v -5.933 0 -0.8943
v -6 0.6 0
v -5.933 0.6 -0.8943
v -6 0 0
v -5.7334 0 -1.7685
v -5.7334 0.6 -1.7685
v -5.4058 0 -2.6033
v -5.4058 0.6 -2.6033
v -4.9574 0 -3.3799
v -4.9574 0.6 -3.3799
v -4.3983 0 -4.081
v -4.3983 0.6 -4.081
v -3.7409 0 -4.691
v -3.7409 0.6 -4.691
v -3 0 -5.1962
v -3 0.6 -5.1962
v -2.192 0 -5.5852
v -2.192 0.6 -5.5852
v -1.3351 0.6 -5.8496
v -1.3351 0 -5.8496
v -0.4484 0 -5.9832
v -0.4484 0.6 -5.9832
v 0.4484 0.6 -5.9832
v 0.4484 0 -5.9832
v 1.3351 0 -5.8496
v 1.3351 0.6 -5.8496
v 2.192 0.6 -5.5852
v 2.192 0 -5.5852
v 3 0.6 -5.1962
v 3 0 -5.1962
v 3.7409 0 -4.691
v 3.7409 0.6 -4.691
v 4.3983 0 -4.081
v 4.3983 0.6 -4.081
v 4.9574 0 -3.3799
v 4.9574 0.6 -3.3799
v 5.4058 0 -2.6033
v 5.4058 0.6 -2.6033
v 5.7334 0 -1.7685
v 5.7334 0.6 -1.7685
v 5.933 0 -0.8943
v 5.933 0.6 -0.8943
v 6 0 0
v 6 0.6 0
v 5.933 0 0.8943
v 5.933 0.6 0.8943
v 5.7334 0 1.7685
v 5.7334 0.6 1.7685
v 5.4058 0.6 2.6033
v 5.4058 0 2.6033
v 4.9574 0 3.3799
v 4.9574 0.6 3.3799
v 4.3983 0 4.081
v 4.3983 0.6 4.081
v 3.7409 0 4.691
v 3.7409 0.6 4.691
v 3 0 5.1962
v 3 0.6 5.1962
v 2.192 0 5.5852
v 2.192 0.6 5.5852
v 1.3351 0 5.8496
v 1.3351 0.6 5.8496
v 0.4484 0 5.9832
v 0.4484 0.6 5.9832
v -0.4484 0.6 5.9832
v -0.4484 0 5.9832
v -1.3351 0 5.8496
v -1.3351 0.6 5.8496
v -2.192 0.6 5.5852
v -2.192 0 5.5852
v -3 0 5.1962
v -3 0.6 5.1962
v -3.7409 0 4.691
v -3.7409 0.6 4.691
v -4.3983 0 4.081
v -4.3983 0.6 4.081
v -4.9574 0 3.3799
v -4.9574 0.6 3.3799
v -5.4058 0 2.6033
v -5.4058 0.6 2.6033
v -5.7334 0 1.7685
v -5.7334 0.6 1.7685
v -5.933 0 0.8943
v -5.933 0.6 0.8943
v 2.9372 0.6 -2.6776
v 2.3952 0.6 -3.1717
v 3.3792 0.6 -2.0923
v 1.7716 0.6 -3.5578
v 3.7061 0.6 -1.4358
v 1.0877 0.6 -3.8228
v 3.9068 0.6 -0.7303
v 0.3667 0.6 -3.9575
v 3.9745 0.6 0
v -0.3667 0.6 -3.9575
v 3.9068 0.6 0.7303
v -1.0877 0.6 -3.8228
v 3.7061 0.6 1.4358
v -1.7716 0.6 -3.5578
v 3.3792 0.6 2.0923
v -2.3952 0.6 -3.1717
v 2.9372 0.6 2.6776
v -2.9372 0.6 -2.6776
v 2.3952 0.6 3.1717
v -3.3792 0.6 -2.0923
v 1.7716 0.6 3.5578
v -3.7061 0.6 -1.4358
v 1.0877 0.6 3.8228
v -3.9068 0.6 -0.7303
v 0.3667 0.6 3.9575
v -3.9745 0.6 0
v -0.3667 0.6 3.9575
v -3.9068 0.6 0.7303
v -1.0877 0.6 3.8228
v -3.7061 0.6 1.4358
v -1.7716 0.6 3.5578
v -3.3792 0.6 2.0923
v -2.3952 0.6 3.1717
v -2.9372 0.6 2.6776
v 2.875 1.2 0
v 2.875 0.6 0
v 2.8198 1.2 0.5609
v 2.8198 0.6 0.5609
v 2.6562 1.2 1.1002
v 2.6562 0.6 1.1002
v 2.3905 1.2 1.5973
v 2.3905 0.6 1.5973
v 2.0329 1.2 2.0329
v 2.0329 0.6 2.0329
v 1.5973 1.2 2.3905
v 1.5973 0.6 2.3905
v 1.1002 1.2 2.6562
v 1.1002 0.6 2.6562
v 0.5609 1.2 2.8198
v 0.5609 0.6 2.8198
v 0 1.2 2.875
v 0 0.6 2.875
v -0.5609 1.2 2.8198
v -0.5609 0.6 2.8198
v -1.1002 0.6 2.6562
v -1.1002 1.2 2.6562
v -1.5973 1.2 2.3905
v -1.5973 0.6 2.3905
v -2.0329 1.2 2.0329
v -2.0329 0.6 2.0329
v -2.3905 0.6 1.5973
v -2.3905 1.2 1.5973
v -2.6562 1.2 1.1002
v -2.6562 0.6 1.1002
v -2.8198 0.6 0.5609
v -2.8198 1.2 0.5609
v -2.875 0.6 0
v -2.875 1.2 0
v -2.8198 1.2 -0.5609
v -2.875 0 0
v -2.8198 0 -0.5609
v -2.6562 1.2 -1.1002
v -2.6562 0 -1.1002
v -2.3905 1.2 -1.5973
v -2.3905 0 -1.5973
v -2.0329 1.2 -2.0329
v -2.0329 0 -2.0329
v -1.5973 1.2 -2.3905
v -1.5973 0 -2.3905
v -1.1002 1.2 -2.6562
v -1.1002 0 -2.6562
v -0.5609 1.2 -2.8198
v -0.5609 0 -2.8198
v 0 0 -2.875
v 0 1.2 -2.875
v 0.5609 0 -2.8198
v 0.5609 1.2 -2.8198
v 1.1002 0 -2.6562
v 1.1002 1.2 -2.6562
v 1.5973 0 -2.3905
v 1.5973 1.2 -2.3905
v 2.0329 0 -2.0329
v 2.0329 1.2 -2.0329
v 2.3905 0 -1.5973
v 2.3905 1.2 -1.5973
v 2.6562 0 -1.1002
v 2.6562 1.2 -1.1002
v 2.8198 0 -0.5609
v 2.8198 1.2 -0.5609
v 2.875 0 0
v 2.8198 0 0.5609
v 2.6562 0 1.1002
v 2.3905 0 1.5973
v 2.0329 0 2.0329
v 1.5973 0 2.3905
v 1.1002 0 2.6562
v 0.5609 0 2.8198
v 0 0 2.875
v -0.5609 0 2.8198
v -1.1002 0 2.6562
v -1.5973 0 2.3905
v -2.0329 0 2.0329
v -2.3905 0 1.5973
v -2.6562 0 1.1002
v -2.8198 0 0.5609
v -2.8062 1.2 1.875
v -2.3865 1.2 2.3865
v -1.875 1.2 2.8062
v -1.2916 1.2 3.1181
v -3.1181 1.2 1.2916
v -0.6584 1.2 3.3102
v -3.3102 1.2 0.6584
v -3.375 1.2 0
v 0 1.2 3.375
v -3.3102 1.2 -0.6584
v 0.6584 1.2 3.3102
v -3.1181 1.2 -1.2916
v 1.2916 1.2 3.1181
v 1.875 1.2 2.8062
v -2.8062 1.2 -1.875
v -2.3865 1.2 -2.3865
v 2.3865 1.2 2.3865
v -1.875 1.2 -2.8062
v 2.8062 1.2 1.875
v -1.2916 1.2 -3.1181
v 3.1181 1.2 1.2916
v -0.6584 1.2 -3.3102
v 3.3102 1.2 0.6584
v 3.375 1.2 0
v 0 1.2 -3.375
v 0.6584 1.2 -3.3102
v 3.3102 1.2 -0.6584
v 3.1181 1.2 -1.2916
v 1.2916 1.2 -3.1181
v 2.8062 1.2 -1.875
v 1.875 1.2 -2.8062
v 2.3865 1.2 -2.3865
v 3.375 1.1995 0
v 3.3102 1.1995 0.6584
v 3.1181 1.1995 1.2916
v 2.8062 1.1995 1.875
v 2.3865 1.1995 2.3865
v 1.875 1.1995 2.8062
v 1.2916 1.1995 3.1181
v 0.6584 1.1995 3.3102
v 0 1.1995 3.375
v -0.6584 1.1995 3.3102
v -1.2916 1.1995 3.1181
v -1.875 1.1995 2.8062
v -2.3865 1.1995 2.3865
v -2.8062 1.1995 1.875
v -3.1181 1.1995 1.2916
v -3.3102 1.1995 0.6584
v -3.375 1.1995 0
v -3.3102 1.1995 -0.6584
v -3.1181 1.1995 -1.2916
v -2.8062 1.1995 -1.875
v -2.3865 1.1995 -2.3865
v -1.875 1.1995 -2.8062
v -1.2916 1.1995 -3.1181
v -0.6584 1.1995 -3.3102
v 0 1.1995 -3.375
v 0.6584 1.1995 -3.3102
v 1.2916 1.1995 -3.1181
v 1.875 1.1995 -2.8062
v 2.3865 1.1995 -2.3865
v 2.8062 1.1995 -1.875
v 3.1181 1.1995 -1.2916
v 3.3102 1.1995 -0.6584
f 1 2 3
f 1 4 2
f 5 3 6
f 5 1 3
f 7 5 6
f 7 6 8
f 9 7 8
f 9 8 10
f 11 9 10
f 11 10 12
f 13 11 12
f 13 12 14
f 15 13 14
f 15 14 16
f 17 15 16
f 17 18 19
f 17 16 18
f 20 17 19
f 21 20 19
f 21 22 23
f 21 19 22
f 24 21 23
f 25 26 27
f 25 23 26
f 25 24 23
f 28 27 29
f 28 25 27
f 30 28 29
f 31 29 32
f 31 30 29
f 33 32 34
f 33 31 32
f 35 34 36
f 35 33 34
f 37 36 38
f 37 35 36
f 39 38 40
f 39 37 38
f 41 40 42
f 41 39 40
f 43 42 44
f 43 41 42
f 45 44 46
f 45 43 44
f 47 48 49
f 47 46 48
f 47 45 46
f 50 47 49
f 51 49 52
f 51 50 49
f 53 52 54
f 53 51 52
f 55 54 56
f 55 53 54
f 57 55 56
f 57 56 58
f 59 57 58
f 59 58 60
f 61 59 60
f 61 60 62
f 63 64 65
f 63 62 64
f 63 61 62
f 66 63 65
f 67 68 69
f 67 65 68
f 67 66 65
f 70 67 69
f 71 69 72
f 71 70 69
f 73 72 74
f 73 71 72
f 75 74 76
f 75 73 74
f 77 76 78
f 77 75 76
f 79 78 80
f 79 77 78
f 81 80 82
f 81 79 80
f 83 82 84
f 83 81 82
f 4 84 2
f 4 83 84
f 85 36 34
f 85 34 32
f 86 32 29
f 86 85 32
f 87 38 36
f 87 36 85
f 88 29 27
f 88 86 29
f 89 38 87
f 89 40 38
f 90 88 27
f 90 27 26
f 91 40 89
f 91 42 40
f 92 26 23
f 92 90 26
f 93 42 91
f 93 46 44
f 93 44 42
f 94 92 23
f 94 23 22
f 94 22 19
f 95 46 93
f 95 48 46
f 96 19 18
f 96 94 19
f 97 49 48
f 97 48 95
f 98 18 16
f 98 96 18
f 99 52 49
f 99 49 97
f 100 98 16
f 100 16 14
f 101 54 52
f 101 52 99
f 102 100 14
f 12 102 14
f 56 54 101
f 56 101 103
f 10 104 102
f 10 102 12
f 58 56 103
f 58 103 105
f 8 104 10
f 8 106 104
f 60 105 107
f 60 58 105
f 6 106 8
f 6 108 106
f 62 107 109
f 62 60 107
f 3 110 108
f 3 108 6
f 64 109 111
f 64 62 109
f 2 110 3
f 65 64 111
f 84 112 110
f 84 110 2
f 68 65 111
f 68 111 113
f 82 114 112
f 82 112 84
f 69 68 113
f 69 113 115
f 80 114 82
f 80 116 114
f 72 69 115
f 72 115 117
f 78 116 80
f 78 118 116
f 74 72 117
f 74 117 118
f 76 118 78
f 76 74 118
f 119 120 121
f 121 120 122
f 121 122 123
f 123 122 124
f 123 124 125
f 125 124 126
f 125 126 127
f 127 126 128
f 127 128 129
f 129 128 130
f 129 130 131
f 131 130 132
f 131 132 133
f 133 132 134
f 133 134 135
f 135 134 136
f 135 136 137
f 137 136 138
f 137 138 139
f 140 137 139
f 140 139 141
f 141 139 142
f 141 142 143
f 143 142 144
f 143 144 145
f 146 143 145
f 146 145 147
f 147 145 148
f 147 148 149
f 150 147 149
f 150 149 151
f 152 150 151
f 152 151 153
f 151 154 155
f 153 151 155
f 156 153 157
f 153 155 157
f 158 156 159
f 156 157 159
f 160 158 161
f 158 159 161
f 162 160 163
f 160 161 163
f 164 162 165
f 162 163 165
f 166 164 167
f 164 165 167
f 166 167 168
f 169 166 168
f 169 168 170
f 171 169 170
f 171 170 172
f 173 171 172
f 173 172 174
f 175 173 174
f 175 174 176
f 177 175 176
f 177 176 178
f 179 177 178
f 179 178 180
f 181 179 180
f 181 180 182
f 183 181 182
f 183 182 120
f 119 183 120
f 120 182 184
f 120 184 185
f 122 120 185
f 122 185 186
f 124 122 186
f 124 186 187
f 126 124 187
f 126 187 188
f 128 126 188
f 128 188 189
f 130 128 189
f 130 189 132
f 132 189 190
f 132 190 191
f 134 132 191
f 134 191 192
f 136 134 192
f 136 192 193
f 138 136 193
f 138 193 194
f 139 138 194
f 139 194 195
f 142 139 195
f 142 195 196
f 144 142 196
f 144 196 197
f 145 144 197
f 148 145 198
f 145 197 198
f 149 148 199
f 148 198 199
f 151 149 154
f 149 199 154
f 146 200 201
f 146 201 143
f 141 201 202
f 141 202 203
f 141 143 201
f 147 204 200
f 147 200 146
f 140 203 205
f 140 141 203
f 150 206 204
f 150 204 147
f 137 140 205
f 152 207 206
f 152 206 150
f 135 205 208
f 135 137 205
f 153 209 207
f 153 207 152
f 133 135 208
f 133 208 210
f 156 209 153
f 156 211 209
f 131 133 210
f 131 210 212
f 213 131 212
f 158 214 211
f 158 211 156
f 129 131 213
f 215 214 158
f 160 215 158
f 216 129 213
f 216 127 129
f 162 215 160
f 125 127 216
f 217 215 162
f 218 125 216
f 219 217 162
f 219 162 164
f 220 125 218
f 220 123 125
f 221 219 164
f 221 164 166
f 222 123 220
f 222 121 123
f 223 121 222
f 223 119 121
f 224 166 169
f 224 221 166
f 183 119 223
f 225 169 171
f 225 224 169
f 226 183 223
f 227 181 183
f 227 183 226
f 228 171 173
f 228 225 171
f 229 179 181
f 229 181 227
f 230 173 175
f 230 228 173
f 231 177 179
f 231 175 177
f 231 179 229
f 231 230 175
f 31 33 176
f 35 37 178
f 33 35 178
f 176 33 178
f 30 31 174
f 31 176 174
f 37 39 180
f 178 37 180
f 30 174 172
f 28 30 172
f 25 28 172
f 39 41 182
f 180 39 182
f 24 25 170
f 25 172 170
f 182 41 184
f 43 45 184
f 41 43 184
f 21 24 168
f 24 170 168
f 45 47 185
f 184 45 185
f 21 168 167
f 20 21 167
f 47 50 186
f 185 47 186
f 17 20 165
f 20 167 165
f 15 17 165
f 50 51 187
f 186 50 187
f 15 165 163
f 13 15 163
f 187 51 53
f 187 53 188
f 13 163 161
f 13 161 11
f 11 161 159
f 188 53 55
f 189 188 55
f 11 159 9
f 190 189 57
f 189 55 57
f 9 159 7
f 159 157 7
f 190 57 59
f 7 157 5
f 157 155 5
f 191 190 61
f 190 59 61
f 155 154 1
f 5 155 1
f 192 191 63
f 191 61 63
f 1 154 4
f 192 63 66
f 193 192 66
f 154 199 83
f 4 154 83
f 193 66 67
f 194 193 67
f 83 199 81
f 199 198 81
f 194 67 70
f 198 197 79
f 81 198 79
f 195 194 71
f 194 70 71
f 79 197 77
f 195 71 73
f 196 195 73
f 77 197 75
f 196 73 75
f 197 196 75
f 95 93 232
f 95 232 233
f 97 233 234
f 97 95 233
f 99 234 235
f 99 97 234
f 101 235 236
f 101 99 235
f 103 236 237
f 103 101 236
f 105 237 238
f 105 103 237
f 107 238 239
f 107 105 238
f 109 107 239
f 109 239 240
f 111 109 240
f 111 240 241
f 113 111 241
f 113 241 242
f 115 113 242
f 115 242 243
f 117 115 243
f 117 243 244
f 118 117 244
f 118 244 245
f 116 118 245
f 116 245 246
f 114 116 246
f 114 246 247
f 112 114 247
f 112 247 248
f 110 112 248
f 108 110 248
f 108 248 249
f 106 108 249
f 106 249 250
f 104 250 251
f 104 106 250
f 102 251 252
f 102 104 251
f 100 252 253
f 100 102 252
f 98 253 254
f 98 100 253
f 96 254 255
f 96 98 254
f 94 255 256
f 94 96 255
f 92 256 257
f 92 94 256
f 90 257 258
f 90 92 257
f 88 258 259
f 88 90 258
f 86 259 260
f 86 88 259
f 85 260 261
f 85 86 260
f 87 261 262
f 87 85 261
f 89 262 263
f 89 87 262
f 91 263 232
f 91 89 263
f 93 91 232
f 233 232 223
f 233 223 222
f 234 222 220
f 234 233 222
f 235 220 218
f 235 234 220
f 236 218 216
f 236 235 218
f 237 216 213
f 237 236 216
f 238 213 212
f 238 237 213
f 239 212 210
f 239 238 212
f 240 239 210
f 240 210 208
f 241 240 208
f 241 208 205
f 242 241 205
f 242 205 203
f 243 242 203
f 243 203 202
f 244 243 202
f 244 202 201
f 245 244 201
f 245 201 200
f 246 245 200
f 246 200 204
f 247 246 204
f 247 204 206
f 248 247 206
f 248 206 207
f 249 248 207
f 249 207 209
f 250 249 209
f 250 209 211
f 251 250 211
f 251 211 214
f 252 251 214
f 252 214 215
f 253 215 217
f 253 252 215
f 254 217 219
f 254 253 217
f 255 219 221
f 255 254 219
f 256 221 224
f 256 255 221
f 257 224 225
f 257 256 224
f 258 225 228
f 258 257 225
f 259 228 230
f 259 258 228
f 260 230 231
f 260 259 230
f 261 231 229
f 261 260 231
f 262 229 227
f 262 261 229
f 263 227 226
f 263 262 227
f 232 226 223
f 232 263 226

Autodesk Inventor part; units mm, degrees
ref_plane "YZ Plane" through (0, 0, 0) normal (1, 0, 0) x (0, 1, 0)
ref_plane "XZ Plane" through (0, 0, 0) normal (0, 1, 0) x (-1, 0, 0)
ref_plane "XY Plane" through (0, 0, 0) normal (0, 0, 1) x (1, 0, 0)
sketch "Sketch1" plane through (0, 0, 0) normal (0, 1, 0) x (-1, 0, 0)
  circle A0 centre (0, 0) radius 2.875
  circle A1 centre (0, 0) radius 6
  dimension "d0" = 5.75
  dimension "d1" = 12
extrude "Extrusion1" add sketch "Sketch1" along normal blind 0.6
sketch "Sketch2" plane through (0, 0.6, 0) normal (0, 1, 0) x (1, 0, 0)
  circle A0 centre (0, 0) radius 2.875 projected
  circle A1 centre (0, 0) radius 6 projected
  circle A2 centre (0, 0) radius 3.375
  dimension "d4" = 0.5
extrude "Extrusion2" add sketch "Sketch2" along normal blind 0.6 contours A2
chamfer "Chamfer1" distance 0.6 angle 45 1 edges at (-3.375, 0.6, 0)
properties part number "m5_shim_alt"
